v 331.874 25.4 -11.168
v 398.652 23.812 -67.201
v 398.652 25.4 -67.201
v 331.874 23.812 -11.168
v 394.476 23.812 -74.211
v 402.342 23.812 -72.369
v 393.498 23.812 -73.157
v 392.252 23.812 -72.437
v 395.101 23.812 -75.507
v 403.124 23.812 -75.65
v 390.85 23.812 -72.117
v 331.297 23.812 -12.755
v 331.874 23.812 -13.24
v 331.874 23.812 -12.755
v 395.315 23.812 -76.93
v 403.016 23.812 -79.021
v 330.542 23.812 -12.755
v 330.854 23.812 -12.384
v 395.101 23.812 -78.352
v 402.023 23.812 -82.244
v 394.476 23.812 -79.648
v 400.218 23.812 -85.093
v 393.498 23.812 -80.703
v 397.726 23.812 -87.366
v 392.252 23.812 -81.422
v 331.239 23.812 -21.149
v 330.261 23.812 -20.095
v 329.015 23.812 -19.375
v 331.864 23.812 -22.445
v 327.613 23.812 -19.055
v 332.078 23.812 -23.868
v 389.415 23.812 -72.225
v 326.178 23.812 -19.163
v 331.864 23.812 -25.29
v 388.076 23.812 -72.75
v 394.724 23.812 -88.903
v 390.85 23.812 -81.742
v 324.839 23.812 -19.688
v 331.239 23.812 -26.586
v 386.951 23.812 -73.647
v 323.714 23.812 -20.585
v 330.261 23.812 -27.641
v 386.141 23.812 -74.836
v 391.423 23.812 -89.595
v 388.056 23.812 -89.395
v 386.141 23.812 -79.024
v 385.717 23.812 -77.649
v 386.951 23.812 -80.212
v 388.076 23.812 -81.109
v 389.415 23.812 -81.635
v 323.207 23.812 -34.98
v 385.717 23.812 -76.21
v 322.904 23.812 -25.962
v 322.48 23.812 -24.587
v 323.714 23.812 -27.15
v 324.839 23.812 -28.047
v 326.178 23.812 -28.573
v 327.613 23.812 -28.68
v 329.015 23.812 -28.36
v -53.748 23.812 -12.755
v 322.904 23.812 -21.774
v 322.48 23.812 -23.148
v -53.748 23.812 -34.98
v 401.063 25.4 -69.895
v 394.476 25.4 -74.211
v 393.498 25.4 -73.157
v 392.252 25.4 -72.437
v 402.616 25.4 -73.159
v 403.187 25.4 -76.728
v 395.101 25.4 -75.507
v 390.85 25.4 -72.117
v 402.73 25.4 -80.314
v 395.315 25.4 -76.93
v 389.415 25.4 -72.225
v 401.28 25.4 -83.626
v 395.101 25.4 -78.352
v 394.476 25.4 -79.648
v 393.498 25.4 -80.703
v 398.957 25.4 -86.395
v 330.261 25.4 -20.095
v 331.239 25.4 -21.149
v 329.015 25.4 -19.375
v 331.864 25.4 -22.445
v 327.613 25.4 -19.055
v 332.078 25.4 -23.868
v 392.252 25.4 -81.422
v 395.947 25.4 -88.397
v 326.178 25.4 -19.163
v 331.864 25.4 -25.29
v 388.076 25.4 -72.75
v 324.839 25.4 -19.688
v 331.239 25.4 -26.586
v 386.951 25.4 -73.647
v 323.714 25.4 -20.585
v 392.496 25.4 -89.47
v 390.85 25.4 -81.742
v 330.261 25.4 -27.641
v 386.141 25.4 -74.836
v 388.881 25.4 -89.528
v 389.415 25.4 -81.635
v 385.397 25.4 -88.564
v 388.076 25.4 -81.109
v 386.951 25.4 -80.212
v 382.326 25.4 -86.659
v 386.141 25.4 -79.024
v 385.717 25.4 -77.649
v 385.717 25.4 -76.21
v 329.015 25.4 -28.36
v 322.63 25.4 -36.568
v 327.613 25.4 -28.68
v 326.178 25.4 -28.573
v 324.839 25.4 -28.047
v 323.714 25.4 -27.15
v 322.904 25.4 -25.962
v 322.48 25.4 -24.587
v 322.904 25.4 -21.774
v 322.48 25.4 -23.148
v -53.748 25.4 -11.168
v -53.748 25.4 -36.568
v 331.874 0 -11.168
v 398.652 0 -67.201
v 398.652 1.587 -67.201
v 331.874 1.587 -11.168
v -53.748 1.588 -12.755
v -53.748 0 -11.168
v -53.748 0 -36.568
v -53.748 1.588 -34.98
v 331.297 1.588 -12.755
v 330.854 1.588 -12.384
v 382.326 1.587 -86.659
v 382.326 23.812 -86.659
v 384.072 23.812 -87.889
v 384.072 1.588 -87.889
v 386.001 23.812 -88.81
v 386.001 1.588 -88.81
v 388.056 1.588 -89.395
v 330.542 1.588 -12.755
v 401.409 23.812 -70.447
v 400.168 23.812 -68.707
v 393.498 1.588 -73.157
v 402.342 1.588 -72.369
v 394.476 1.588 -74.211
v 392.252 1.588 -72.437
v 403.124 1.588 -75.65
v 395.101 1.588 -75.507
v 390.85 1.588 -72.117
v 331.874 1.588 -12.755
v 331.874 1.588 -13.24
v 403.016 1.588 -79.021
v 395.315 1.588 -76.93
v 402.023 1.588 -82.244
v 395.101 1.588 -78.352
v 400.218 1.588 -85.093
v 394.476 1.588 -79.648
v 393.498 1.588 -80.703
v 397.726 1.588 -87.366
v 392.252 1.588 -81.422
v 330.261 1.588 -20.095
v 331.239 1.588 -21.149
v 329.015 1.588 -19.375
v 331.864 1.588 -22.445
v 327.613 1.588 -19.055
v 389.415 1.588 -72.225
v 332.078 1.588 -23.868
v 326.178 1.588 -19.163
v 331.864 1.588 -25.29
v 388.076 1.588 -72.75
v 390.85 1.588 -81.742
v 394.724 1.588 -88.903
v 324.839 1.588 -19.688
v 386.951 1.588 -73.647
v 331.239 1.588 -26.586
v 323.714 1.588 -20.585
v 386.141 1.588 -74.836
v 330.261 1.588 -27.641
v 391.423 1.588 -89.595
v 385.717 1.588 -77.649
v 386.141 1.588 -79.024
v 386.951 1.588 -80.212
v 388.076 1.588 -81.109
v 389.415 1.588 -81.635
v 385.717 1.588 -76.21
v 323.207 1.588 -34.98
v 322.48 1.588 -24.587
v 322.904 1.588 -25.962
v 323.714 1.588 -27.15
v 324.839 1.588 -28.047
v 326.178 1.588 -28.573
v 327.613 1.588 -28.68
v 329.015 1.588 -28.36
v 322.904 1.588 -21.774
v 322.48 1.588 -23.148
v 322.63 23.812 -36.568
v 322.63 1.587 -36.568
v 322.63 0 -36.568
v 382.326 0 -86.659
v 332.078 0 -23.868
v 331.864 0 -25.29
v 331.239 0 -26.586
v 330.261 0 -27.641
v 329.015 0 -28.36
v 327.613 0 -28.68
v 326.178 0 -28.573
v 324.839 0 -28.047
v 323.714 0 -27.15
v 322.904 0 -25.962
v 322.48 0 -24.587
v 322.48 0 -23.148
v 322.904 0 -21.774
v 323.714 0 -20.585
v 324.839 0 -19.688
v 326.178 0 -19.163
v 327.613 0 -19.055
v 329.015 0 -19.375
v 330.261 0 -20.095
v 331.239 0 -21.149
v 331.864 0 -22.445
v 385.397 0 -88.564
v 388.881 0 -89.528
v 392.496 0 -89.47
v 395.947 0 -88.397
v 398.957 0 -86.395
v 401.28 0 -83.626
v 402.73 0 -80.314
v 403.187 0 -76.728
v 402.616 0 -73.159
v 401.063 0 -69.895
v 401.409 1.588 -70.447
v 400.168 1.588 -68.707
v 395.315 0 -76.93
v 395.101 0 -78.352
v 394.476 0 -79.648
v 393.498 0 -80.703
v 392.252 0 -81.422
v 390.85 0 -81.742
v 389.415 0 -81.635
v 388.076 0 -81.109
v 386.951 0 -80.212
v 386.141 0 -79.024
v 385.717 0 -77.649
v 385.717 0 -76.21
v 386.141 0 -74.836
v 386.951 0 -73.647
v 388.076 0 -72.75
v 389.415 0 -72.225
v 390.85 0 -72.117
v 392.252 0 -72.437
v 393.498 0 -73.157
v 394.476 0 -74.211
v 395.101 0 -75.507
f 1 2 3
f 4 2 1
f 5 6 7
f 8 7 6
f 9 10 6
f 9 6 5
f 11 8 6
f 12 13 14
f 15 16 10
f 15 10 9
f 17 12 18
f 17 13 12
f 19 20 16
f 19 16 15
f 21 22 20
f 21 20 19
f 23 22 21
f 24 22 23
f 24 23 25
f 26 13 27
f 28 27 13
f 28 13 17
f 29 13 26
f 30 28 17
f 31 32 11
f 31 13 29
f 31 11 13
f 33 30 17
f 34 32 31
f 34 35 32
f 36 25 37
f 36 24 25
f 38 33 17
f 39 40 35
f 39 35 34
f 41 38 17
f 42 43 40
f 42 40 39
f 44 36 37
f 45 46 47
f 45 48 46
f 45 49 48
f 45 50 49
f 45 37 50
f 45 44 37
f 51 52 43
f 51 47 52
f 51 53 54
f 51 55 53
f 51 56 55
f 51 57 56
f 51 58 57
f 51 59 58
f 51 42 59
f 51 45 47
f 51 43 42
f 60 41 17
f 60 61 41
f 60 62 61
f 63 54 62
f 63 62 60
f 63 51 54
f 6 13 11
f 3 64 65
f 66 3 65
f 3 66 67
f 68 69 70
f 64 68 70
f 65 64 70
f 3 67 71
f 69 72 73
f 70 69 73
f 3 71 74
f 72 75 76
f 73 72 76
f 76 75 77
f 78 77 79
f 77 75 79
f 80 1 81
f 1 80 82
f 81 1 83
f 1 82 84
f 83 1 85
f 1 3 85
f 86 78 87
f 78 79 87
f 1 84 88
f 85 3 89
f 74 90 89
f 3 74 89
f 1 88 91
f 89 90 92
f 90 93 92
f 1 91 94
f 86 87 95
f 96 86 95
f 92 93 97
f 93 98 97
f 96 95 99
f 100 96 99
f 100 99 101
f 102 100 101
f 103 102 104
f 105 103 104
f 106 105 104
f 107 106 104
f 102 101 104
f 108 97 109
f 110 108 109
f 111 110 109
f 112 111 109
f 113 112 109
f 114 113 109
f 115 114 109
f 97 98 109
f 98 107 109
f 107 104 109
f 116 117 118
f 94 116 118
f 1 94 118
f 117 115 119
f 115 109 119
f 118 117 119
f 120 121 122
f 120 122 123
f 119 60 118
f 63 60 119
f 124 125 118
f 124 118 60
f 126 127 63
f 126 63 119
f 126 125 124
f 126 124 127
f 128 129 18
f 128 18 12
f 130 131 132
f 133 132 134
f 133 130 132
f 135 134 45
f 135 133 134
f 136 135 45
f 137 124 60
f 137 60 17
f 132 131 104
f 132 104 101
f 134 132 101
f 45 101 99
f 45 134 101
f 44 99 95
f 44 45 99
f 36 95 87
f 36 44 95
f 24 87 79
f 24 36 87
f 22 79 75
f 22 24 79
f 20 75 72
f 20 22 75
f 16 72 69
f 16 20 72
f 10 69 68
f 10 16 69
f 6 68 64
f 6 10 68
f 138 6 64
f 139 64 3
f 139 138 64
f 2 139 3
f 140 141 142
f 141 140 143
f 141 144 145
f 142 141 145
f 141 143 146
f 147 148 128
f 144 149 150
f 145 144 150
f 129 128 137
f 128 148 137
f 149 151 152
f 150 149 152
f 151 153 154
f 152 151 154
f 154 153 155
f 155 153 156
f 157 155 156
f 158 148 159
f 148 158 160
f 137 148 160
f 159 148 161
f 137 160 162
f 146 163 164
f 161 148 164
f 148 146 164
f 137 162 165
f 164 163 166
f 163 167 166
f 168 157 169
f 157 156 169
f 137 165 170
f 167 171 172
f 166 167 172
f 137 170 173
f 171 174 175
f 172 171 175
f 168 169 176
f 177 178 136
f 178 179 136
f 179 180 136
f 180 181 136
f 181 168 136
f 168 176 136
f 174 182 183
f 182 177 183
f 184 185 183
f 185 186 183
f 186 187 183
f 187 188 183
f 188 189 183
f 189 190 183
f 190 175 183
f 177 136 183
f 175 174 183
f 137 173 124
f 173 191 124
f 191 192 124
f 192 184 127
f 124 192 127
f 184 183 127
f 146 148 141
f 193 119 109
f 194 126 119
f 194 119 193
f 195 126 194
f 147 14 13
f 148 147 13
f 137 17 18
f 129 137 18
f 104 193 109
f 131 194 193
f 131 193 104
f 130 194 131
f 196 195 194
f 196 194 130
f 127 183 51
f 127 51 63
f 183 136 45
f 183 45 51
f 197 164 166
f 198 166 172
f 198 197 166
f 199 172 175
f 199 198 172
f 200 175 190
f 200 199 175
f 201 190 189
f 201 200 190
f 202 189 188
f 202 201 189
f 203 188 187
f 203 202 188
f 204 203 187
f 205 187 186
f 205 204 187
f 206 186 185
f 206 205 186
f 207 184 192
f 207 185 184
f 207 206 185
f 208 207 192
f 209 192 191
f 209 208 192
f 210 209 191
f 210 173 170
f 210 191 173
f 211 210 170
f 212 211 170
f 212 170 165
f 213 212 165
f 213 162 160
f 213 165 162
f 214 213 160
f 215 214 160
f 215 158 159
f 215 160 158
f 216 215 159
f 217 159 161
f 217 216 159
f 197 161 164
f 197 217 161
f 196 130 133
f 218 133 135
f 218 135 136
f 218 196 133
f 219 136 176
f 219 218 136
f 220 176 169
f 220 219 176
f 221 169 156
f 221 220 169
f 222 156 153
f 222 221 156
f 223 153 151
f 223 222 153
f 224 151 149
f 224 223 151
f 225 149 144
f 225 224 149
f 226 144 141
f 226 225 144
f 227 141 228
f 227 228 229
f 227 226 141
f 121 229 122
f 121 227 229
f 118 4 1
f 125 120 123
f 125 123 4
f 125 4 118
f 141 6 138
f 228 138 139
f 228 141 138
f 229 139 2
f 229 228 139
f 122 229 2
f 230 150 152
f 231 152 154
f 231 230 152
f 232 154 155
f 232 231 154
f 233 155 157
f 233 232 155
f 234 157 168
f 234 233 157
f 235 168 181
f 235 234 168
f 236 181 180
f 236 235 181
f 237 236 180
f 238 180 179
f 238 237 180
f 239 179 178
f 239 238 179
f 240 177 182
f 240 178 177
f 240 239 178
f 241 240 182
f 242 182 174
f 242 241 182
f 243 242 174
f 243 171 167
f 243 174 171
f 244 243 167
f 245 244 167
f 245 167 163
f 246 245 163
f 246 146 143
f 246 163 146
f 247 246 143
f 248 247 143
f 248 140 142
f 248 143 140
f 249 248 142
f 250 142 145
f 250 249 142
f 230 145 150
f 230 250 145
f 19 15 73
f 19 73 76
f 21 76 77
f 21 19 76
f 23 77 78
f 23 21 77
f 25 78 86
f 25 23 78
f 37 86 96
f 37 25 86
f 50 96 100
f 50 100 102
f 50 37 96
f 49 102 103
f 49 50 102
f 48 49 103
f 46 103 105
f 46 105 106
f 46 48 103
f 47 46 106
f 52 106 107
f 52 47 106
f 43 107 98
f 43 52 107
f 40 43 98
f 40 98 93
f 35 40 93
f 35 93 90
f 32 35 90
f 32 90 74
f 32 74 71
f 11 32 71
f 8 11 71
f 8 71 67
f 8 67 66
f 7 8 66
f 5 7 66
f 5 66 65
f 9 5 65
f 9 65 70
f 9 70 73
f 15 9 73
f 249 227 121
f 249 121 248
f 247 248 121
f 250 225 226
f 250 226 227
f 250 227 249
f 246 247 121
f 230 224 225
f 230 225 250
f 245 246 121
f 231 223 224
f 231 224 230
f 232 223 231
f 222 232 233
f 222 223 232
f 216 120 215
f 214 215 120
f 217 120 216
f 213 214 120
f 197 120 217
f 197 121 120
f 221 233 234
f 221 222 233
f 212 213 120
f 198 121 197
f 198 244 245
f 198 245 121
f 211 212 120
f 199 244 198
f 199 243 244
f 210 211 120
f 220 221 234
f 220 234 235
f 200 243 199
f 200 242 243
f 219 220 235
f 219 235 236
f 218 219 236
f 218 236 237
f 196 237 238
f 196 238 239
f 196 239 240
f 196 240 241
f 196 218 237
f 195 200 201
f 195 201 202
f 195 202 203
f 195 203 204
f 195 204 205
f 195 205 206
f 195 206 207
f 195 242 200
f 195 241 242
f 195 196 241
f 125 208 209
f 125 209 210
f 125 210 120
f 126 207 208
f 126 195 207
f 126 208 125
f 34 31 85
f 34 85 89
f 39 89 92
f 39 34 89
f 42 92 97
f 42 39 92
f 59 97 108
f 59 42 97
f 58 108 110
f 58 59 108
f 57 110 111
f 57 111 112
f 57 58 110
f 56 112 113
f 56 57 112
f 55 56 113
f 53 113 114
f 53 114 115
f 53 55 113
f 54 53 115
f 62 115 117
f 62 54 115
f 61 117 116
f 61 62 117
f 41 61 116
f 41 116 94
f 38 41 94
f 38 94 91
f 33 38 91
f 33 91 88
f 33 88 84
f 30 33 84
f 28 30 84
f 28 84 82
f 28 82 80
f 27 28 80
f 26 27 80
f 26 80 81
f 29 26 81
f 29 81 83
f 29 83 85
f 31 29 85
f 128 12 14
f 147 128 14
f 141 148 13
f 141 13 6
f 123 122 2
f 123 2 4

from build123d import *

# Parameters (mm, degrees)
BOSS_EXTRUDE5_DEPTH = 1.5875
BOSS_EXTRUDE6_DEPTH = 22.225
BOSS_EXTRUDE7_DEPTH = 22.225
BOSS_EXTRUDE8_DEPTH = 1.5875
HOLE1_OUTLINE_R     = 4.826
HOLE1_DEPTH         = 25.4
HOLE2_OUTLINE_R     = 4.826
HOLE2_DEPTH         = 25.4


# Read off the part's stored shape, not the designer's step: Hole1, Hole2
with BuildPart() as part:
    # Sketch9 → Boss-Extrude5 (new body)
    with BuildSketch(Plane(origin=(0, 0, 0), x_dir=(1, 0, 0), z_dir=(0, 1, 0))):
        with BuildLine():
            Line((322.629578317, 36.567646265), (382.325566472, 86.658527908))
            ThreePointArc((382.325566472, 86.658527908), (400.217733608, 85.093166118), (398.652371818, 67.200998981))
            Line((398.652371818, 67.200998981), (331.874422413, 11.167646265))
            Line((331.874422413, 11.167646265), (-53.747999635, 11.167646265))
            Line((-53.747999635, 11.167646265), (-53.747999635, 36.567646265))
            Line((-53.747999635, 36.567646265), (322.629578317, 36.567646265))
        make_face()
    extrude(amount=BOSS_EXTRUDE5_DEPTH)

    # Sketch11 → Boss-Extrude6 (add)
    with BuildSketch(Plane(origin=(0, 1.5875, 0), x_dir=(1, 0, 0), z_dir=(0, 1, 0))):
        with BuildLine():
            Line((323.207381137, 34.980146265), (-53.747999635, 34.980146265))
            Line((-53.747999635, 34.980146265), (-53.747999635, 36.567646265))
            Line((-53.747999635, 36.567646265), (322.62957839, 36.567646265))
            Line((322.62957839, 36.567646265), (382.325566502, 86.658527872))
            ThreePointArc((382.325566502, 86.658527872), (385.016979631, 88.390449757), (388.055909658, 89.394522629))
            Line((388.055909658, 89.394522629), (323.207381137, 34.980146265))
        make_face()
    extrude(amount=BOSS_EXTRUDE6_DEPTH)

    # Sketch12 → Boss-Extrude7 (add)
    with BuildSketch(Plane(origin=(0, 1.5875, 0), x_dir=(1, 0, 0), z_dir=(0, 1, 0))):
        with BuildLine():
            Line((331.874422341, 13.239980337), (402.341864283, 72.369184881))
            ThreePointArc((402.341864283, 72.369184881), (400.825340873, 69.550778454), (398.652371788, 67.200999017))
            Line((398.652371788, 67.200999017), (331.874422341, 11.167646265))
            Line((331.874422341, 11.167646265), (-53.747999635, 11.167646265))
            Line((-53.747999635, 11.167646265), (-53.747999635, 12.755146265))
            Line((-53.747999635, 12.755146265), (330.542351676, 12.755146265))
            Line((330.542351676, 12.755146265), (330.85399701, 12.383741818))
            Line((330.85399701, 12.383741818), (331.296619594, 12.755146265))
            Line((331.296619594, 12.755146265), (331.874422341, 12.755146265))
            Line((331.874422341, 12.755146265), (331.874422341, 13.239980337))
        make_face()
    extrude(amount=BOSS_EXTRUDE7_DEPTH)

    # Sketch13 → Boss-Extrude8 (add)
    with BuildSketch(Plane(origin=(0, 23.8125, 0), x_dir=(1, 0, 0), z_dir=(0, 1, 0))):
        with BuildLine():
            Line((322.629578317, 36.567646265), (382.325566472, 86.658527908))
            ThreePointArc((382.325566472, 86.658527908), (400.217733608, 85.093166118), (398.652371818, 67.200998981))
            Line((398.652371818, 67.200998981), (331.874422413, 11.167646265))
            Line((331.874422413, 11.167646265), (-53.747999635, 11.167646265))
            Line((-53.747999635, 11.167646265), (-53.747999635, 36.567646265))
            Line((-53.747999635, 36.567646265), (322.629578317, 36.567646265))
        make_face()
    extrude(amount=BOSS_EXTRUDE8_DEPTH)

    # Hole1 outline → Hole1 (cut)
    with BuildSketch(Plane(origin=(0, 0, 0), x_dir=(1, 0, 0), z_dir=(0, 1, 0))):
        with Locations((327.252000365, 23.867646265)):
            Circle(HOLE1_OUTLINE_R)
    extrude(amount=HOLE1_DEPTH, mode=Mode.SUBTRACT)

    # Hole2 outline → Hole2 (cut)
    with BuildSketch(Plane(origin=(0, 0, 0), x_dir=(1, 0, 0), z_dir=(0, 1, 0))):
        with Locations((390.488969145, 76.929763445)):
            Circle(HOLE2_OUTLINE_R)
    extrude(amount=HOLE2_DEPTH, mode=Mode.SUBTRACT)


solid = part.part
